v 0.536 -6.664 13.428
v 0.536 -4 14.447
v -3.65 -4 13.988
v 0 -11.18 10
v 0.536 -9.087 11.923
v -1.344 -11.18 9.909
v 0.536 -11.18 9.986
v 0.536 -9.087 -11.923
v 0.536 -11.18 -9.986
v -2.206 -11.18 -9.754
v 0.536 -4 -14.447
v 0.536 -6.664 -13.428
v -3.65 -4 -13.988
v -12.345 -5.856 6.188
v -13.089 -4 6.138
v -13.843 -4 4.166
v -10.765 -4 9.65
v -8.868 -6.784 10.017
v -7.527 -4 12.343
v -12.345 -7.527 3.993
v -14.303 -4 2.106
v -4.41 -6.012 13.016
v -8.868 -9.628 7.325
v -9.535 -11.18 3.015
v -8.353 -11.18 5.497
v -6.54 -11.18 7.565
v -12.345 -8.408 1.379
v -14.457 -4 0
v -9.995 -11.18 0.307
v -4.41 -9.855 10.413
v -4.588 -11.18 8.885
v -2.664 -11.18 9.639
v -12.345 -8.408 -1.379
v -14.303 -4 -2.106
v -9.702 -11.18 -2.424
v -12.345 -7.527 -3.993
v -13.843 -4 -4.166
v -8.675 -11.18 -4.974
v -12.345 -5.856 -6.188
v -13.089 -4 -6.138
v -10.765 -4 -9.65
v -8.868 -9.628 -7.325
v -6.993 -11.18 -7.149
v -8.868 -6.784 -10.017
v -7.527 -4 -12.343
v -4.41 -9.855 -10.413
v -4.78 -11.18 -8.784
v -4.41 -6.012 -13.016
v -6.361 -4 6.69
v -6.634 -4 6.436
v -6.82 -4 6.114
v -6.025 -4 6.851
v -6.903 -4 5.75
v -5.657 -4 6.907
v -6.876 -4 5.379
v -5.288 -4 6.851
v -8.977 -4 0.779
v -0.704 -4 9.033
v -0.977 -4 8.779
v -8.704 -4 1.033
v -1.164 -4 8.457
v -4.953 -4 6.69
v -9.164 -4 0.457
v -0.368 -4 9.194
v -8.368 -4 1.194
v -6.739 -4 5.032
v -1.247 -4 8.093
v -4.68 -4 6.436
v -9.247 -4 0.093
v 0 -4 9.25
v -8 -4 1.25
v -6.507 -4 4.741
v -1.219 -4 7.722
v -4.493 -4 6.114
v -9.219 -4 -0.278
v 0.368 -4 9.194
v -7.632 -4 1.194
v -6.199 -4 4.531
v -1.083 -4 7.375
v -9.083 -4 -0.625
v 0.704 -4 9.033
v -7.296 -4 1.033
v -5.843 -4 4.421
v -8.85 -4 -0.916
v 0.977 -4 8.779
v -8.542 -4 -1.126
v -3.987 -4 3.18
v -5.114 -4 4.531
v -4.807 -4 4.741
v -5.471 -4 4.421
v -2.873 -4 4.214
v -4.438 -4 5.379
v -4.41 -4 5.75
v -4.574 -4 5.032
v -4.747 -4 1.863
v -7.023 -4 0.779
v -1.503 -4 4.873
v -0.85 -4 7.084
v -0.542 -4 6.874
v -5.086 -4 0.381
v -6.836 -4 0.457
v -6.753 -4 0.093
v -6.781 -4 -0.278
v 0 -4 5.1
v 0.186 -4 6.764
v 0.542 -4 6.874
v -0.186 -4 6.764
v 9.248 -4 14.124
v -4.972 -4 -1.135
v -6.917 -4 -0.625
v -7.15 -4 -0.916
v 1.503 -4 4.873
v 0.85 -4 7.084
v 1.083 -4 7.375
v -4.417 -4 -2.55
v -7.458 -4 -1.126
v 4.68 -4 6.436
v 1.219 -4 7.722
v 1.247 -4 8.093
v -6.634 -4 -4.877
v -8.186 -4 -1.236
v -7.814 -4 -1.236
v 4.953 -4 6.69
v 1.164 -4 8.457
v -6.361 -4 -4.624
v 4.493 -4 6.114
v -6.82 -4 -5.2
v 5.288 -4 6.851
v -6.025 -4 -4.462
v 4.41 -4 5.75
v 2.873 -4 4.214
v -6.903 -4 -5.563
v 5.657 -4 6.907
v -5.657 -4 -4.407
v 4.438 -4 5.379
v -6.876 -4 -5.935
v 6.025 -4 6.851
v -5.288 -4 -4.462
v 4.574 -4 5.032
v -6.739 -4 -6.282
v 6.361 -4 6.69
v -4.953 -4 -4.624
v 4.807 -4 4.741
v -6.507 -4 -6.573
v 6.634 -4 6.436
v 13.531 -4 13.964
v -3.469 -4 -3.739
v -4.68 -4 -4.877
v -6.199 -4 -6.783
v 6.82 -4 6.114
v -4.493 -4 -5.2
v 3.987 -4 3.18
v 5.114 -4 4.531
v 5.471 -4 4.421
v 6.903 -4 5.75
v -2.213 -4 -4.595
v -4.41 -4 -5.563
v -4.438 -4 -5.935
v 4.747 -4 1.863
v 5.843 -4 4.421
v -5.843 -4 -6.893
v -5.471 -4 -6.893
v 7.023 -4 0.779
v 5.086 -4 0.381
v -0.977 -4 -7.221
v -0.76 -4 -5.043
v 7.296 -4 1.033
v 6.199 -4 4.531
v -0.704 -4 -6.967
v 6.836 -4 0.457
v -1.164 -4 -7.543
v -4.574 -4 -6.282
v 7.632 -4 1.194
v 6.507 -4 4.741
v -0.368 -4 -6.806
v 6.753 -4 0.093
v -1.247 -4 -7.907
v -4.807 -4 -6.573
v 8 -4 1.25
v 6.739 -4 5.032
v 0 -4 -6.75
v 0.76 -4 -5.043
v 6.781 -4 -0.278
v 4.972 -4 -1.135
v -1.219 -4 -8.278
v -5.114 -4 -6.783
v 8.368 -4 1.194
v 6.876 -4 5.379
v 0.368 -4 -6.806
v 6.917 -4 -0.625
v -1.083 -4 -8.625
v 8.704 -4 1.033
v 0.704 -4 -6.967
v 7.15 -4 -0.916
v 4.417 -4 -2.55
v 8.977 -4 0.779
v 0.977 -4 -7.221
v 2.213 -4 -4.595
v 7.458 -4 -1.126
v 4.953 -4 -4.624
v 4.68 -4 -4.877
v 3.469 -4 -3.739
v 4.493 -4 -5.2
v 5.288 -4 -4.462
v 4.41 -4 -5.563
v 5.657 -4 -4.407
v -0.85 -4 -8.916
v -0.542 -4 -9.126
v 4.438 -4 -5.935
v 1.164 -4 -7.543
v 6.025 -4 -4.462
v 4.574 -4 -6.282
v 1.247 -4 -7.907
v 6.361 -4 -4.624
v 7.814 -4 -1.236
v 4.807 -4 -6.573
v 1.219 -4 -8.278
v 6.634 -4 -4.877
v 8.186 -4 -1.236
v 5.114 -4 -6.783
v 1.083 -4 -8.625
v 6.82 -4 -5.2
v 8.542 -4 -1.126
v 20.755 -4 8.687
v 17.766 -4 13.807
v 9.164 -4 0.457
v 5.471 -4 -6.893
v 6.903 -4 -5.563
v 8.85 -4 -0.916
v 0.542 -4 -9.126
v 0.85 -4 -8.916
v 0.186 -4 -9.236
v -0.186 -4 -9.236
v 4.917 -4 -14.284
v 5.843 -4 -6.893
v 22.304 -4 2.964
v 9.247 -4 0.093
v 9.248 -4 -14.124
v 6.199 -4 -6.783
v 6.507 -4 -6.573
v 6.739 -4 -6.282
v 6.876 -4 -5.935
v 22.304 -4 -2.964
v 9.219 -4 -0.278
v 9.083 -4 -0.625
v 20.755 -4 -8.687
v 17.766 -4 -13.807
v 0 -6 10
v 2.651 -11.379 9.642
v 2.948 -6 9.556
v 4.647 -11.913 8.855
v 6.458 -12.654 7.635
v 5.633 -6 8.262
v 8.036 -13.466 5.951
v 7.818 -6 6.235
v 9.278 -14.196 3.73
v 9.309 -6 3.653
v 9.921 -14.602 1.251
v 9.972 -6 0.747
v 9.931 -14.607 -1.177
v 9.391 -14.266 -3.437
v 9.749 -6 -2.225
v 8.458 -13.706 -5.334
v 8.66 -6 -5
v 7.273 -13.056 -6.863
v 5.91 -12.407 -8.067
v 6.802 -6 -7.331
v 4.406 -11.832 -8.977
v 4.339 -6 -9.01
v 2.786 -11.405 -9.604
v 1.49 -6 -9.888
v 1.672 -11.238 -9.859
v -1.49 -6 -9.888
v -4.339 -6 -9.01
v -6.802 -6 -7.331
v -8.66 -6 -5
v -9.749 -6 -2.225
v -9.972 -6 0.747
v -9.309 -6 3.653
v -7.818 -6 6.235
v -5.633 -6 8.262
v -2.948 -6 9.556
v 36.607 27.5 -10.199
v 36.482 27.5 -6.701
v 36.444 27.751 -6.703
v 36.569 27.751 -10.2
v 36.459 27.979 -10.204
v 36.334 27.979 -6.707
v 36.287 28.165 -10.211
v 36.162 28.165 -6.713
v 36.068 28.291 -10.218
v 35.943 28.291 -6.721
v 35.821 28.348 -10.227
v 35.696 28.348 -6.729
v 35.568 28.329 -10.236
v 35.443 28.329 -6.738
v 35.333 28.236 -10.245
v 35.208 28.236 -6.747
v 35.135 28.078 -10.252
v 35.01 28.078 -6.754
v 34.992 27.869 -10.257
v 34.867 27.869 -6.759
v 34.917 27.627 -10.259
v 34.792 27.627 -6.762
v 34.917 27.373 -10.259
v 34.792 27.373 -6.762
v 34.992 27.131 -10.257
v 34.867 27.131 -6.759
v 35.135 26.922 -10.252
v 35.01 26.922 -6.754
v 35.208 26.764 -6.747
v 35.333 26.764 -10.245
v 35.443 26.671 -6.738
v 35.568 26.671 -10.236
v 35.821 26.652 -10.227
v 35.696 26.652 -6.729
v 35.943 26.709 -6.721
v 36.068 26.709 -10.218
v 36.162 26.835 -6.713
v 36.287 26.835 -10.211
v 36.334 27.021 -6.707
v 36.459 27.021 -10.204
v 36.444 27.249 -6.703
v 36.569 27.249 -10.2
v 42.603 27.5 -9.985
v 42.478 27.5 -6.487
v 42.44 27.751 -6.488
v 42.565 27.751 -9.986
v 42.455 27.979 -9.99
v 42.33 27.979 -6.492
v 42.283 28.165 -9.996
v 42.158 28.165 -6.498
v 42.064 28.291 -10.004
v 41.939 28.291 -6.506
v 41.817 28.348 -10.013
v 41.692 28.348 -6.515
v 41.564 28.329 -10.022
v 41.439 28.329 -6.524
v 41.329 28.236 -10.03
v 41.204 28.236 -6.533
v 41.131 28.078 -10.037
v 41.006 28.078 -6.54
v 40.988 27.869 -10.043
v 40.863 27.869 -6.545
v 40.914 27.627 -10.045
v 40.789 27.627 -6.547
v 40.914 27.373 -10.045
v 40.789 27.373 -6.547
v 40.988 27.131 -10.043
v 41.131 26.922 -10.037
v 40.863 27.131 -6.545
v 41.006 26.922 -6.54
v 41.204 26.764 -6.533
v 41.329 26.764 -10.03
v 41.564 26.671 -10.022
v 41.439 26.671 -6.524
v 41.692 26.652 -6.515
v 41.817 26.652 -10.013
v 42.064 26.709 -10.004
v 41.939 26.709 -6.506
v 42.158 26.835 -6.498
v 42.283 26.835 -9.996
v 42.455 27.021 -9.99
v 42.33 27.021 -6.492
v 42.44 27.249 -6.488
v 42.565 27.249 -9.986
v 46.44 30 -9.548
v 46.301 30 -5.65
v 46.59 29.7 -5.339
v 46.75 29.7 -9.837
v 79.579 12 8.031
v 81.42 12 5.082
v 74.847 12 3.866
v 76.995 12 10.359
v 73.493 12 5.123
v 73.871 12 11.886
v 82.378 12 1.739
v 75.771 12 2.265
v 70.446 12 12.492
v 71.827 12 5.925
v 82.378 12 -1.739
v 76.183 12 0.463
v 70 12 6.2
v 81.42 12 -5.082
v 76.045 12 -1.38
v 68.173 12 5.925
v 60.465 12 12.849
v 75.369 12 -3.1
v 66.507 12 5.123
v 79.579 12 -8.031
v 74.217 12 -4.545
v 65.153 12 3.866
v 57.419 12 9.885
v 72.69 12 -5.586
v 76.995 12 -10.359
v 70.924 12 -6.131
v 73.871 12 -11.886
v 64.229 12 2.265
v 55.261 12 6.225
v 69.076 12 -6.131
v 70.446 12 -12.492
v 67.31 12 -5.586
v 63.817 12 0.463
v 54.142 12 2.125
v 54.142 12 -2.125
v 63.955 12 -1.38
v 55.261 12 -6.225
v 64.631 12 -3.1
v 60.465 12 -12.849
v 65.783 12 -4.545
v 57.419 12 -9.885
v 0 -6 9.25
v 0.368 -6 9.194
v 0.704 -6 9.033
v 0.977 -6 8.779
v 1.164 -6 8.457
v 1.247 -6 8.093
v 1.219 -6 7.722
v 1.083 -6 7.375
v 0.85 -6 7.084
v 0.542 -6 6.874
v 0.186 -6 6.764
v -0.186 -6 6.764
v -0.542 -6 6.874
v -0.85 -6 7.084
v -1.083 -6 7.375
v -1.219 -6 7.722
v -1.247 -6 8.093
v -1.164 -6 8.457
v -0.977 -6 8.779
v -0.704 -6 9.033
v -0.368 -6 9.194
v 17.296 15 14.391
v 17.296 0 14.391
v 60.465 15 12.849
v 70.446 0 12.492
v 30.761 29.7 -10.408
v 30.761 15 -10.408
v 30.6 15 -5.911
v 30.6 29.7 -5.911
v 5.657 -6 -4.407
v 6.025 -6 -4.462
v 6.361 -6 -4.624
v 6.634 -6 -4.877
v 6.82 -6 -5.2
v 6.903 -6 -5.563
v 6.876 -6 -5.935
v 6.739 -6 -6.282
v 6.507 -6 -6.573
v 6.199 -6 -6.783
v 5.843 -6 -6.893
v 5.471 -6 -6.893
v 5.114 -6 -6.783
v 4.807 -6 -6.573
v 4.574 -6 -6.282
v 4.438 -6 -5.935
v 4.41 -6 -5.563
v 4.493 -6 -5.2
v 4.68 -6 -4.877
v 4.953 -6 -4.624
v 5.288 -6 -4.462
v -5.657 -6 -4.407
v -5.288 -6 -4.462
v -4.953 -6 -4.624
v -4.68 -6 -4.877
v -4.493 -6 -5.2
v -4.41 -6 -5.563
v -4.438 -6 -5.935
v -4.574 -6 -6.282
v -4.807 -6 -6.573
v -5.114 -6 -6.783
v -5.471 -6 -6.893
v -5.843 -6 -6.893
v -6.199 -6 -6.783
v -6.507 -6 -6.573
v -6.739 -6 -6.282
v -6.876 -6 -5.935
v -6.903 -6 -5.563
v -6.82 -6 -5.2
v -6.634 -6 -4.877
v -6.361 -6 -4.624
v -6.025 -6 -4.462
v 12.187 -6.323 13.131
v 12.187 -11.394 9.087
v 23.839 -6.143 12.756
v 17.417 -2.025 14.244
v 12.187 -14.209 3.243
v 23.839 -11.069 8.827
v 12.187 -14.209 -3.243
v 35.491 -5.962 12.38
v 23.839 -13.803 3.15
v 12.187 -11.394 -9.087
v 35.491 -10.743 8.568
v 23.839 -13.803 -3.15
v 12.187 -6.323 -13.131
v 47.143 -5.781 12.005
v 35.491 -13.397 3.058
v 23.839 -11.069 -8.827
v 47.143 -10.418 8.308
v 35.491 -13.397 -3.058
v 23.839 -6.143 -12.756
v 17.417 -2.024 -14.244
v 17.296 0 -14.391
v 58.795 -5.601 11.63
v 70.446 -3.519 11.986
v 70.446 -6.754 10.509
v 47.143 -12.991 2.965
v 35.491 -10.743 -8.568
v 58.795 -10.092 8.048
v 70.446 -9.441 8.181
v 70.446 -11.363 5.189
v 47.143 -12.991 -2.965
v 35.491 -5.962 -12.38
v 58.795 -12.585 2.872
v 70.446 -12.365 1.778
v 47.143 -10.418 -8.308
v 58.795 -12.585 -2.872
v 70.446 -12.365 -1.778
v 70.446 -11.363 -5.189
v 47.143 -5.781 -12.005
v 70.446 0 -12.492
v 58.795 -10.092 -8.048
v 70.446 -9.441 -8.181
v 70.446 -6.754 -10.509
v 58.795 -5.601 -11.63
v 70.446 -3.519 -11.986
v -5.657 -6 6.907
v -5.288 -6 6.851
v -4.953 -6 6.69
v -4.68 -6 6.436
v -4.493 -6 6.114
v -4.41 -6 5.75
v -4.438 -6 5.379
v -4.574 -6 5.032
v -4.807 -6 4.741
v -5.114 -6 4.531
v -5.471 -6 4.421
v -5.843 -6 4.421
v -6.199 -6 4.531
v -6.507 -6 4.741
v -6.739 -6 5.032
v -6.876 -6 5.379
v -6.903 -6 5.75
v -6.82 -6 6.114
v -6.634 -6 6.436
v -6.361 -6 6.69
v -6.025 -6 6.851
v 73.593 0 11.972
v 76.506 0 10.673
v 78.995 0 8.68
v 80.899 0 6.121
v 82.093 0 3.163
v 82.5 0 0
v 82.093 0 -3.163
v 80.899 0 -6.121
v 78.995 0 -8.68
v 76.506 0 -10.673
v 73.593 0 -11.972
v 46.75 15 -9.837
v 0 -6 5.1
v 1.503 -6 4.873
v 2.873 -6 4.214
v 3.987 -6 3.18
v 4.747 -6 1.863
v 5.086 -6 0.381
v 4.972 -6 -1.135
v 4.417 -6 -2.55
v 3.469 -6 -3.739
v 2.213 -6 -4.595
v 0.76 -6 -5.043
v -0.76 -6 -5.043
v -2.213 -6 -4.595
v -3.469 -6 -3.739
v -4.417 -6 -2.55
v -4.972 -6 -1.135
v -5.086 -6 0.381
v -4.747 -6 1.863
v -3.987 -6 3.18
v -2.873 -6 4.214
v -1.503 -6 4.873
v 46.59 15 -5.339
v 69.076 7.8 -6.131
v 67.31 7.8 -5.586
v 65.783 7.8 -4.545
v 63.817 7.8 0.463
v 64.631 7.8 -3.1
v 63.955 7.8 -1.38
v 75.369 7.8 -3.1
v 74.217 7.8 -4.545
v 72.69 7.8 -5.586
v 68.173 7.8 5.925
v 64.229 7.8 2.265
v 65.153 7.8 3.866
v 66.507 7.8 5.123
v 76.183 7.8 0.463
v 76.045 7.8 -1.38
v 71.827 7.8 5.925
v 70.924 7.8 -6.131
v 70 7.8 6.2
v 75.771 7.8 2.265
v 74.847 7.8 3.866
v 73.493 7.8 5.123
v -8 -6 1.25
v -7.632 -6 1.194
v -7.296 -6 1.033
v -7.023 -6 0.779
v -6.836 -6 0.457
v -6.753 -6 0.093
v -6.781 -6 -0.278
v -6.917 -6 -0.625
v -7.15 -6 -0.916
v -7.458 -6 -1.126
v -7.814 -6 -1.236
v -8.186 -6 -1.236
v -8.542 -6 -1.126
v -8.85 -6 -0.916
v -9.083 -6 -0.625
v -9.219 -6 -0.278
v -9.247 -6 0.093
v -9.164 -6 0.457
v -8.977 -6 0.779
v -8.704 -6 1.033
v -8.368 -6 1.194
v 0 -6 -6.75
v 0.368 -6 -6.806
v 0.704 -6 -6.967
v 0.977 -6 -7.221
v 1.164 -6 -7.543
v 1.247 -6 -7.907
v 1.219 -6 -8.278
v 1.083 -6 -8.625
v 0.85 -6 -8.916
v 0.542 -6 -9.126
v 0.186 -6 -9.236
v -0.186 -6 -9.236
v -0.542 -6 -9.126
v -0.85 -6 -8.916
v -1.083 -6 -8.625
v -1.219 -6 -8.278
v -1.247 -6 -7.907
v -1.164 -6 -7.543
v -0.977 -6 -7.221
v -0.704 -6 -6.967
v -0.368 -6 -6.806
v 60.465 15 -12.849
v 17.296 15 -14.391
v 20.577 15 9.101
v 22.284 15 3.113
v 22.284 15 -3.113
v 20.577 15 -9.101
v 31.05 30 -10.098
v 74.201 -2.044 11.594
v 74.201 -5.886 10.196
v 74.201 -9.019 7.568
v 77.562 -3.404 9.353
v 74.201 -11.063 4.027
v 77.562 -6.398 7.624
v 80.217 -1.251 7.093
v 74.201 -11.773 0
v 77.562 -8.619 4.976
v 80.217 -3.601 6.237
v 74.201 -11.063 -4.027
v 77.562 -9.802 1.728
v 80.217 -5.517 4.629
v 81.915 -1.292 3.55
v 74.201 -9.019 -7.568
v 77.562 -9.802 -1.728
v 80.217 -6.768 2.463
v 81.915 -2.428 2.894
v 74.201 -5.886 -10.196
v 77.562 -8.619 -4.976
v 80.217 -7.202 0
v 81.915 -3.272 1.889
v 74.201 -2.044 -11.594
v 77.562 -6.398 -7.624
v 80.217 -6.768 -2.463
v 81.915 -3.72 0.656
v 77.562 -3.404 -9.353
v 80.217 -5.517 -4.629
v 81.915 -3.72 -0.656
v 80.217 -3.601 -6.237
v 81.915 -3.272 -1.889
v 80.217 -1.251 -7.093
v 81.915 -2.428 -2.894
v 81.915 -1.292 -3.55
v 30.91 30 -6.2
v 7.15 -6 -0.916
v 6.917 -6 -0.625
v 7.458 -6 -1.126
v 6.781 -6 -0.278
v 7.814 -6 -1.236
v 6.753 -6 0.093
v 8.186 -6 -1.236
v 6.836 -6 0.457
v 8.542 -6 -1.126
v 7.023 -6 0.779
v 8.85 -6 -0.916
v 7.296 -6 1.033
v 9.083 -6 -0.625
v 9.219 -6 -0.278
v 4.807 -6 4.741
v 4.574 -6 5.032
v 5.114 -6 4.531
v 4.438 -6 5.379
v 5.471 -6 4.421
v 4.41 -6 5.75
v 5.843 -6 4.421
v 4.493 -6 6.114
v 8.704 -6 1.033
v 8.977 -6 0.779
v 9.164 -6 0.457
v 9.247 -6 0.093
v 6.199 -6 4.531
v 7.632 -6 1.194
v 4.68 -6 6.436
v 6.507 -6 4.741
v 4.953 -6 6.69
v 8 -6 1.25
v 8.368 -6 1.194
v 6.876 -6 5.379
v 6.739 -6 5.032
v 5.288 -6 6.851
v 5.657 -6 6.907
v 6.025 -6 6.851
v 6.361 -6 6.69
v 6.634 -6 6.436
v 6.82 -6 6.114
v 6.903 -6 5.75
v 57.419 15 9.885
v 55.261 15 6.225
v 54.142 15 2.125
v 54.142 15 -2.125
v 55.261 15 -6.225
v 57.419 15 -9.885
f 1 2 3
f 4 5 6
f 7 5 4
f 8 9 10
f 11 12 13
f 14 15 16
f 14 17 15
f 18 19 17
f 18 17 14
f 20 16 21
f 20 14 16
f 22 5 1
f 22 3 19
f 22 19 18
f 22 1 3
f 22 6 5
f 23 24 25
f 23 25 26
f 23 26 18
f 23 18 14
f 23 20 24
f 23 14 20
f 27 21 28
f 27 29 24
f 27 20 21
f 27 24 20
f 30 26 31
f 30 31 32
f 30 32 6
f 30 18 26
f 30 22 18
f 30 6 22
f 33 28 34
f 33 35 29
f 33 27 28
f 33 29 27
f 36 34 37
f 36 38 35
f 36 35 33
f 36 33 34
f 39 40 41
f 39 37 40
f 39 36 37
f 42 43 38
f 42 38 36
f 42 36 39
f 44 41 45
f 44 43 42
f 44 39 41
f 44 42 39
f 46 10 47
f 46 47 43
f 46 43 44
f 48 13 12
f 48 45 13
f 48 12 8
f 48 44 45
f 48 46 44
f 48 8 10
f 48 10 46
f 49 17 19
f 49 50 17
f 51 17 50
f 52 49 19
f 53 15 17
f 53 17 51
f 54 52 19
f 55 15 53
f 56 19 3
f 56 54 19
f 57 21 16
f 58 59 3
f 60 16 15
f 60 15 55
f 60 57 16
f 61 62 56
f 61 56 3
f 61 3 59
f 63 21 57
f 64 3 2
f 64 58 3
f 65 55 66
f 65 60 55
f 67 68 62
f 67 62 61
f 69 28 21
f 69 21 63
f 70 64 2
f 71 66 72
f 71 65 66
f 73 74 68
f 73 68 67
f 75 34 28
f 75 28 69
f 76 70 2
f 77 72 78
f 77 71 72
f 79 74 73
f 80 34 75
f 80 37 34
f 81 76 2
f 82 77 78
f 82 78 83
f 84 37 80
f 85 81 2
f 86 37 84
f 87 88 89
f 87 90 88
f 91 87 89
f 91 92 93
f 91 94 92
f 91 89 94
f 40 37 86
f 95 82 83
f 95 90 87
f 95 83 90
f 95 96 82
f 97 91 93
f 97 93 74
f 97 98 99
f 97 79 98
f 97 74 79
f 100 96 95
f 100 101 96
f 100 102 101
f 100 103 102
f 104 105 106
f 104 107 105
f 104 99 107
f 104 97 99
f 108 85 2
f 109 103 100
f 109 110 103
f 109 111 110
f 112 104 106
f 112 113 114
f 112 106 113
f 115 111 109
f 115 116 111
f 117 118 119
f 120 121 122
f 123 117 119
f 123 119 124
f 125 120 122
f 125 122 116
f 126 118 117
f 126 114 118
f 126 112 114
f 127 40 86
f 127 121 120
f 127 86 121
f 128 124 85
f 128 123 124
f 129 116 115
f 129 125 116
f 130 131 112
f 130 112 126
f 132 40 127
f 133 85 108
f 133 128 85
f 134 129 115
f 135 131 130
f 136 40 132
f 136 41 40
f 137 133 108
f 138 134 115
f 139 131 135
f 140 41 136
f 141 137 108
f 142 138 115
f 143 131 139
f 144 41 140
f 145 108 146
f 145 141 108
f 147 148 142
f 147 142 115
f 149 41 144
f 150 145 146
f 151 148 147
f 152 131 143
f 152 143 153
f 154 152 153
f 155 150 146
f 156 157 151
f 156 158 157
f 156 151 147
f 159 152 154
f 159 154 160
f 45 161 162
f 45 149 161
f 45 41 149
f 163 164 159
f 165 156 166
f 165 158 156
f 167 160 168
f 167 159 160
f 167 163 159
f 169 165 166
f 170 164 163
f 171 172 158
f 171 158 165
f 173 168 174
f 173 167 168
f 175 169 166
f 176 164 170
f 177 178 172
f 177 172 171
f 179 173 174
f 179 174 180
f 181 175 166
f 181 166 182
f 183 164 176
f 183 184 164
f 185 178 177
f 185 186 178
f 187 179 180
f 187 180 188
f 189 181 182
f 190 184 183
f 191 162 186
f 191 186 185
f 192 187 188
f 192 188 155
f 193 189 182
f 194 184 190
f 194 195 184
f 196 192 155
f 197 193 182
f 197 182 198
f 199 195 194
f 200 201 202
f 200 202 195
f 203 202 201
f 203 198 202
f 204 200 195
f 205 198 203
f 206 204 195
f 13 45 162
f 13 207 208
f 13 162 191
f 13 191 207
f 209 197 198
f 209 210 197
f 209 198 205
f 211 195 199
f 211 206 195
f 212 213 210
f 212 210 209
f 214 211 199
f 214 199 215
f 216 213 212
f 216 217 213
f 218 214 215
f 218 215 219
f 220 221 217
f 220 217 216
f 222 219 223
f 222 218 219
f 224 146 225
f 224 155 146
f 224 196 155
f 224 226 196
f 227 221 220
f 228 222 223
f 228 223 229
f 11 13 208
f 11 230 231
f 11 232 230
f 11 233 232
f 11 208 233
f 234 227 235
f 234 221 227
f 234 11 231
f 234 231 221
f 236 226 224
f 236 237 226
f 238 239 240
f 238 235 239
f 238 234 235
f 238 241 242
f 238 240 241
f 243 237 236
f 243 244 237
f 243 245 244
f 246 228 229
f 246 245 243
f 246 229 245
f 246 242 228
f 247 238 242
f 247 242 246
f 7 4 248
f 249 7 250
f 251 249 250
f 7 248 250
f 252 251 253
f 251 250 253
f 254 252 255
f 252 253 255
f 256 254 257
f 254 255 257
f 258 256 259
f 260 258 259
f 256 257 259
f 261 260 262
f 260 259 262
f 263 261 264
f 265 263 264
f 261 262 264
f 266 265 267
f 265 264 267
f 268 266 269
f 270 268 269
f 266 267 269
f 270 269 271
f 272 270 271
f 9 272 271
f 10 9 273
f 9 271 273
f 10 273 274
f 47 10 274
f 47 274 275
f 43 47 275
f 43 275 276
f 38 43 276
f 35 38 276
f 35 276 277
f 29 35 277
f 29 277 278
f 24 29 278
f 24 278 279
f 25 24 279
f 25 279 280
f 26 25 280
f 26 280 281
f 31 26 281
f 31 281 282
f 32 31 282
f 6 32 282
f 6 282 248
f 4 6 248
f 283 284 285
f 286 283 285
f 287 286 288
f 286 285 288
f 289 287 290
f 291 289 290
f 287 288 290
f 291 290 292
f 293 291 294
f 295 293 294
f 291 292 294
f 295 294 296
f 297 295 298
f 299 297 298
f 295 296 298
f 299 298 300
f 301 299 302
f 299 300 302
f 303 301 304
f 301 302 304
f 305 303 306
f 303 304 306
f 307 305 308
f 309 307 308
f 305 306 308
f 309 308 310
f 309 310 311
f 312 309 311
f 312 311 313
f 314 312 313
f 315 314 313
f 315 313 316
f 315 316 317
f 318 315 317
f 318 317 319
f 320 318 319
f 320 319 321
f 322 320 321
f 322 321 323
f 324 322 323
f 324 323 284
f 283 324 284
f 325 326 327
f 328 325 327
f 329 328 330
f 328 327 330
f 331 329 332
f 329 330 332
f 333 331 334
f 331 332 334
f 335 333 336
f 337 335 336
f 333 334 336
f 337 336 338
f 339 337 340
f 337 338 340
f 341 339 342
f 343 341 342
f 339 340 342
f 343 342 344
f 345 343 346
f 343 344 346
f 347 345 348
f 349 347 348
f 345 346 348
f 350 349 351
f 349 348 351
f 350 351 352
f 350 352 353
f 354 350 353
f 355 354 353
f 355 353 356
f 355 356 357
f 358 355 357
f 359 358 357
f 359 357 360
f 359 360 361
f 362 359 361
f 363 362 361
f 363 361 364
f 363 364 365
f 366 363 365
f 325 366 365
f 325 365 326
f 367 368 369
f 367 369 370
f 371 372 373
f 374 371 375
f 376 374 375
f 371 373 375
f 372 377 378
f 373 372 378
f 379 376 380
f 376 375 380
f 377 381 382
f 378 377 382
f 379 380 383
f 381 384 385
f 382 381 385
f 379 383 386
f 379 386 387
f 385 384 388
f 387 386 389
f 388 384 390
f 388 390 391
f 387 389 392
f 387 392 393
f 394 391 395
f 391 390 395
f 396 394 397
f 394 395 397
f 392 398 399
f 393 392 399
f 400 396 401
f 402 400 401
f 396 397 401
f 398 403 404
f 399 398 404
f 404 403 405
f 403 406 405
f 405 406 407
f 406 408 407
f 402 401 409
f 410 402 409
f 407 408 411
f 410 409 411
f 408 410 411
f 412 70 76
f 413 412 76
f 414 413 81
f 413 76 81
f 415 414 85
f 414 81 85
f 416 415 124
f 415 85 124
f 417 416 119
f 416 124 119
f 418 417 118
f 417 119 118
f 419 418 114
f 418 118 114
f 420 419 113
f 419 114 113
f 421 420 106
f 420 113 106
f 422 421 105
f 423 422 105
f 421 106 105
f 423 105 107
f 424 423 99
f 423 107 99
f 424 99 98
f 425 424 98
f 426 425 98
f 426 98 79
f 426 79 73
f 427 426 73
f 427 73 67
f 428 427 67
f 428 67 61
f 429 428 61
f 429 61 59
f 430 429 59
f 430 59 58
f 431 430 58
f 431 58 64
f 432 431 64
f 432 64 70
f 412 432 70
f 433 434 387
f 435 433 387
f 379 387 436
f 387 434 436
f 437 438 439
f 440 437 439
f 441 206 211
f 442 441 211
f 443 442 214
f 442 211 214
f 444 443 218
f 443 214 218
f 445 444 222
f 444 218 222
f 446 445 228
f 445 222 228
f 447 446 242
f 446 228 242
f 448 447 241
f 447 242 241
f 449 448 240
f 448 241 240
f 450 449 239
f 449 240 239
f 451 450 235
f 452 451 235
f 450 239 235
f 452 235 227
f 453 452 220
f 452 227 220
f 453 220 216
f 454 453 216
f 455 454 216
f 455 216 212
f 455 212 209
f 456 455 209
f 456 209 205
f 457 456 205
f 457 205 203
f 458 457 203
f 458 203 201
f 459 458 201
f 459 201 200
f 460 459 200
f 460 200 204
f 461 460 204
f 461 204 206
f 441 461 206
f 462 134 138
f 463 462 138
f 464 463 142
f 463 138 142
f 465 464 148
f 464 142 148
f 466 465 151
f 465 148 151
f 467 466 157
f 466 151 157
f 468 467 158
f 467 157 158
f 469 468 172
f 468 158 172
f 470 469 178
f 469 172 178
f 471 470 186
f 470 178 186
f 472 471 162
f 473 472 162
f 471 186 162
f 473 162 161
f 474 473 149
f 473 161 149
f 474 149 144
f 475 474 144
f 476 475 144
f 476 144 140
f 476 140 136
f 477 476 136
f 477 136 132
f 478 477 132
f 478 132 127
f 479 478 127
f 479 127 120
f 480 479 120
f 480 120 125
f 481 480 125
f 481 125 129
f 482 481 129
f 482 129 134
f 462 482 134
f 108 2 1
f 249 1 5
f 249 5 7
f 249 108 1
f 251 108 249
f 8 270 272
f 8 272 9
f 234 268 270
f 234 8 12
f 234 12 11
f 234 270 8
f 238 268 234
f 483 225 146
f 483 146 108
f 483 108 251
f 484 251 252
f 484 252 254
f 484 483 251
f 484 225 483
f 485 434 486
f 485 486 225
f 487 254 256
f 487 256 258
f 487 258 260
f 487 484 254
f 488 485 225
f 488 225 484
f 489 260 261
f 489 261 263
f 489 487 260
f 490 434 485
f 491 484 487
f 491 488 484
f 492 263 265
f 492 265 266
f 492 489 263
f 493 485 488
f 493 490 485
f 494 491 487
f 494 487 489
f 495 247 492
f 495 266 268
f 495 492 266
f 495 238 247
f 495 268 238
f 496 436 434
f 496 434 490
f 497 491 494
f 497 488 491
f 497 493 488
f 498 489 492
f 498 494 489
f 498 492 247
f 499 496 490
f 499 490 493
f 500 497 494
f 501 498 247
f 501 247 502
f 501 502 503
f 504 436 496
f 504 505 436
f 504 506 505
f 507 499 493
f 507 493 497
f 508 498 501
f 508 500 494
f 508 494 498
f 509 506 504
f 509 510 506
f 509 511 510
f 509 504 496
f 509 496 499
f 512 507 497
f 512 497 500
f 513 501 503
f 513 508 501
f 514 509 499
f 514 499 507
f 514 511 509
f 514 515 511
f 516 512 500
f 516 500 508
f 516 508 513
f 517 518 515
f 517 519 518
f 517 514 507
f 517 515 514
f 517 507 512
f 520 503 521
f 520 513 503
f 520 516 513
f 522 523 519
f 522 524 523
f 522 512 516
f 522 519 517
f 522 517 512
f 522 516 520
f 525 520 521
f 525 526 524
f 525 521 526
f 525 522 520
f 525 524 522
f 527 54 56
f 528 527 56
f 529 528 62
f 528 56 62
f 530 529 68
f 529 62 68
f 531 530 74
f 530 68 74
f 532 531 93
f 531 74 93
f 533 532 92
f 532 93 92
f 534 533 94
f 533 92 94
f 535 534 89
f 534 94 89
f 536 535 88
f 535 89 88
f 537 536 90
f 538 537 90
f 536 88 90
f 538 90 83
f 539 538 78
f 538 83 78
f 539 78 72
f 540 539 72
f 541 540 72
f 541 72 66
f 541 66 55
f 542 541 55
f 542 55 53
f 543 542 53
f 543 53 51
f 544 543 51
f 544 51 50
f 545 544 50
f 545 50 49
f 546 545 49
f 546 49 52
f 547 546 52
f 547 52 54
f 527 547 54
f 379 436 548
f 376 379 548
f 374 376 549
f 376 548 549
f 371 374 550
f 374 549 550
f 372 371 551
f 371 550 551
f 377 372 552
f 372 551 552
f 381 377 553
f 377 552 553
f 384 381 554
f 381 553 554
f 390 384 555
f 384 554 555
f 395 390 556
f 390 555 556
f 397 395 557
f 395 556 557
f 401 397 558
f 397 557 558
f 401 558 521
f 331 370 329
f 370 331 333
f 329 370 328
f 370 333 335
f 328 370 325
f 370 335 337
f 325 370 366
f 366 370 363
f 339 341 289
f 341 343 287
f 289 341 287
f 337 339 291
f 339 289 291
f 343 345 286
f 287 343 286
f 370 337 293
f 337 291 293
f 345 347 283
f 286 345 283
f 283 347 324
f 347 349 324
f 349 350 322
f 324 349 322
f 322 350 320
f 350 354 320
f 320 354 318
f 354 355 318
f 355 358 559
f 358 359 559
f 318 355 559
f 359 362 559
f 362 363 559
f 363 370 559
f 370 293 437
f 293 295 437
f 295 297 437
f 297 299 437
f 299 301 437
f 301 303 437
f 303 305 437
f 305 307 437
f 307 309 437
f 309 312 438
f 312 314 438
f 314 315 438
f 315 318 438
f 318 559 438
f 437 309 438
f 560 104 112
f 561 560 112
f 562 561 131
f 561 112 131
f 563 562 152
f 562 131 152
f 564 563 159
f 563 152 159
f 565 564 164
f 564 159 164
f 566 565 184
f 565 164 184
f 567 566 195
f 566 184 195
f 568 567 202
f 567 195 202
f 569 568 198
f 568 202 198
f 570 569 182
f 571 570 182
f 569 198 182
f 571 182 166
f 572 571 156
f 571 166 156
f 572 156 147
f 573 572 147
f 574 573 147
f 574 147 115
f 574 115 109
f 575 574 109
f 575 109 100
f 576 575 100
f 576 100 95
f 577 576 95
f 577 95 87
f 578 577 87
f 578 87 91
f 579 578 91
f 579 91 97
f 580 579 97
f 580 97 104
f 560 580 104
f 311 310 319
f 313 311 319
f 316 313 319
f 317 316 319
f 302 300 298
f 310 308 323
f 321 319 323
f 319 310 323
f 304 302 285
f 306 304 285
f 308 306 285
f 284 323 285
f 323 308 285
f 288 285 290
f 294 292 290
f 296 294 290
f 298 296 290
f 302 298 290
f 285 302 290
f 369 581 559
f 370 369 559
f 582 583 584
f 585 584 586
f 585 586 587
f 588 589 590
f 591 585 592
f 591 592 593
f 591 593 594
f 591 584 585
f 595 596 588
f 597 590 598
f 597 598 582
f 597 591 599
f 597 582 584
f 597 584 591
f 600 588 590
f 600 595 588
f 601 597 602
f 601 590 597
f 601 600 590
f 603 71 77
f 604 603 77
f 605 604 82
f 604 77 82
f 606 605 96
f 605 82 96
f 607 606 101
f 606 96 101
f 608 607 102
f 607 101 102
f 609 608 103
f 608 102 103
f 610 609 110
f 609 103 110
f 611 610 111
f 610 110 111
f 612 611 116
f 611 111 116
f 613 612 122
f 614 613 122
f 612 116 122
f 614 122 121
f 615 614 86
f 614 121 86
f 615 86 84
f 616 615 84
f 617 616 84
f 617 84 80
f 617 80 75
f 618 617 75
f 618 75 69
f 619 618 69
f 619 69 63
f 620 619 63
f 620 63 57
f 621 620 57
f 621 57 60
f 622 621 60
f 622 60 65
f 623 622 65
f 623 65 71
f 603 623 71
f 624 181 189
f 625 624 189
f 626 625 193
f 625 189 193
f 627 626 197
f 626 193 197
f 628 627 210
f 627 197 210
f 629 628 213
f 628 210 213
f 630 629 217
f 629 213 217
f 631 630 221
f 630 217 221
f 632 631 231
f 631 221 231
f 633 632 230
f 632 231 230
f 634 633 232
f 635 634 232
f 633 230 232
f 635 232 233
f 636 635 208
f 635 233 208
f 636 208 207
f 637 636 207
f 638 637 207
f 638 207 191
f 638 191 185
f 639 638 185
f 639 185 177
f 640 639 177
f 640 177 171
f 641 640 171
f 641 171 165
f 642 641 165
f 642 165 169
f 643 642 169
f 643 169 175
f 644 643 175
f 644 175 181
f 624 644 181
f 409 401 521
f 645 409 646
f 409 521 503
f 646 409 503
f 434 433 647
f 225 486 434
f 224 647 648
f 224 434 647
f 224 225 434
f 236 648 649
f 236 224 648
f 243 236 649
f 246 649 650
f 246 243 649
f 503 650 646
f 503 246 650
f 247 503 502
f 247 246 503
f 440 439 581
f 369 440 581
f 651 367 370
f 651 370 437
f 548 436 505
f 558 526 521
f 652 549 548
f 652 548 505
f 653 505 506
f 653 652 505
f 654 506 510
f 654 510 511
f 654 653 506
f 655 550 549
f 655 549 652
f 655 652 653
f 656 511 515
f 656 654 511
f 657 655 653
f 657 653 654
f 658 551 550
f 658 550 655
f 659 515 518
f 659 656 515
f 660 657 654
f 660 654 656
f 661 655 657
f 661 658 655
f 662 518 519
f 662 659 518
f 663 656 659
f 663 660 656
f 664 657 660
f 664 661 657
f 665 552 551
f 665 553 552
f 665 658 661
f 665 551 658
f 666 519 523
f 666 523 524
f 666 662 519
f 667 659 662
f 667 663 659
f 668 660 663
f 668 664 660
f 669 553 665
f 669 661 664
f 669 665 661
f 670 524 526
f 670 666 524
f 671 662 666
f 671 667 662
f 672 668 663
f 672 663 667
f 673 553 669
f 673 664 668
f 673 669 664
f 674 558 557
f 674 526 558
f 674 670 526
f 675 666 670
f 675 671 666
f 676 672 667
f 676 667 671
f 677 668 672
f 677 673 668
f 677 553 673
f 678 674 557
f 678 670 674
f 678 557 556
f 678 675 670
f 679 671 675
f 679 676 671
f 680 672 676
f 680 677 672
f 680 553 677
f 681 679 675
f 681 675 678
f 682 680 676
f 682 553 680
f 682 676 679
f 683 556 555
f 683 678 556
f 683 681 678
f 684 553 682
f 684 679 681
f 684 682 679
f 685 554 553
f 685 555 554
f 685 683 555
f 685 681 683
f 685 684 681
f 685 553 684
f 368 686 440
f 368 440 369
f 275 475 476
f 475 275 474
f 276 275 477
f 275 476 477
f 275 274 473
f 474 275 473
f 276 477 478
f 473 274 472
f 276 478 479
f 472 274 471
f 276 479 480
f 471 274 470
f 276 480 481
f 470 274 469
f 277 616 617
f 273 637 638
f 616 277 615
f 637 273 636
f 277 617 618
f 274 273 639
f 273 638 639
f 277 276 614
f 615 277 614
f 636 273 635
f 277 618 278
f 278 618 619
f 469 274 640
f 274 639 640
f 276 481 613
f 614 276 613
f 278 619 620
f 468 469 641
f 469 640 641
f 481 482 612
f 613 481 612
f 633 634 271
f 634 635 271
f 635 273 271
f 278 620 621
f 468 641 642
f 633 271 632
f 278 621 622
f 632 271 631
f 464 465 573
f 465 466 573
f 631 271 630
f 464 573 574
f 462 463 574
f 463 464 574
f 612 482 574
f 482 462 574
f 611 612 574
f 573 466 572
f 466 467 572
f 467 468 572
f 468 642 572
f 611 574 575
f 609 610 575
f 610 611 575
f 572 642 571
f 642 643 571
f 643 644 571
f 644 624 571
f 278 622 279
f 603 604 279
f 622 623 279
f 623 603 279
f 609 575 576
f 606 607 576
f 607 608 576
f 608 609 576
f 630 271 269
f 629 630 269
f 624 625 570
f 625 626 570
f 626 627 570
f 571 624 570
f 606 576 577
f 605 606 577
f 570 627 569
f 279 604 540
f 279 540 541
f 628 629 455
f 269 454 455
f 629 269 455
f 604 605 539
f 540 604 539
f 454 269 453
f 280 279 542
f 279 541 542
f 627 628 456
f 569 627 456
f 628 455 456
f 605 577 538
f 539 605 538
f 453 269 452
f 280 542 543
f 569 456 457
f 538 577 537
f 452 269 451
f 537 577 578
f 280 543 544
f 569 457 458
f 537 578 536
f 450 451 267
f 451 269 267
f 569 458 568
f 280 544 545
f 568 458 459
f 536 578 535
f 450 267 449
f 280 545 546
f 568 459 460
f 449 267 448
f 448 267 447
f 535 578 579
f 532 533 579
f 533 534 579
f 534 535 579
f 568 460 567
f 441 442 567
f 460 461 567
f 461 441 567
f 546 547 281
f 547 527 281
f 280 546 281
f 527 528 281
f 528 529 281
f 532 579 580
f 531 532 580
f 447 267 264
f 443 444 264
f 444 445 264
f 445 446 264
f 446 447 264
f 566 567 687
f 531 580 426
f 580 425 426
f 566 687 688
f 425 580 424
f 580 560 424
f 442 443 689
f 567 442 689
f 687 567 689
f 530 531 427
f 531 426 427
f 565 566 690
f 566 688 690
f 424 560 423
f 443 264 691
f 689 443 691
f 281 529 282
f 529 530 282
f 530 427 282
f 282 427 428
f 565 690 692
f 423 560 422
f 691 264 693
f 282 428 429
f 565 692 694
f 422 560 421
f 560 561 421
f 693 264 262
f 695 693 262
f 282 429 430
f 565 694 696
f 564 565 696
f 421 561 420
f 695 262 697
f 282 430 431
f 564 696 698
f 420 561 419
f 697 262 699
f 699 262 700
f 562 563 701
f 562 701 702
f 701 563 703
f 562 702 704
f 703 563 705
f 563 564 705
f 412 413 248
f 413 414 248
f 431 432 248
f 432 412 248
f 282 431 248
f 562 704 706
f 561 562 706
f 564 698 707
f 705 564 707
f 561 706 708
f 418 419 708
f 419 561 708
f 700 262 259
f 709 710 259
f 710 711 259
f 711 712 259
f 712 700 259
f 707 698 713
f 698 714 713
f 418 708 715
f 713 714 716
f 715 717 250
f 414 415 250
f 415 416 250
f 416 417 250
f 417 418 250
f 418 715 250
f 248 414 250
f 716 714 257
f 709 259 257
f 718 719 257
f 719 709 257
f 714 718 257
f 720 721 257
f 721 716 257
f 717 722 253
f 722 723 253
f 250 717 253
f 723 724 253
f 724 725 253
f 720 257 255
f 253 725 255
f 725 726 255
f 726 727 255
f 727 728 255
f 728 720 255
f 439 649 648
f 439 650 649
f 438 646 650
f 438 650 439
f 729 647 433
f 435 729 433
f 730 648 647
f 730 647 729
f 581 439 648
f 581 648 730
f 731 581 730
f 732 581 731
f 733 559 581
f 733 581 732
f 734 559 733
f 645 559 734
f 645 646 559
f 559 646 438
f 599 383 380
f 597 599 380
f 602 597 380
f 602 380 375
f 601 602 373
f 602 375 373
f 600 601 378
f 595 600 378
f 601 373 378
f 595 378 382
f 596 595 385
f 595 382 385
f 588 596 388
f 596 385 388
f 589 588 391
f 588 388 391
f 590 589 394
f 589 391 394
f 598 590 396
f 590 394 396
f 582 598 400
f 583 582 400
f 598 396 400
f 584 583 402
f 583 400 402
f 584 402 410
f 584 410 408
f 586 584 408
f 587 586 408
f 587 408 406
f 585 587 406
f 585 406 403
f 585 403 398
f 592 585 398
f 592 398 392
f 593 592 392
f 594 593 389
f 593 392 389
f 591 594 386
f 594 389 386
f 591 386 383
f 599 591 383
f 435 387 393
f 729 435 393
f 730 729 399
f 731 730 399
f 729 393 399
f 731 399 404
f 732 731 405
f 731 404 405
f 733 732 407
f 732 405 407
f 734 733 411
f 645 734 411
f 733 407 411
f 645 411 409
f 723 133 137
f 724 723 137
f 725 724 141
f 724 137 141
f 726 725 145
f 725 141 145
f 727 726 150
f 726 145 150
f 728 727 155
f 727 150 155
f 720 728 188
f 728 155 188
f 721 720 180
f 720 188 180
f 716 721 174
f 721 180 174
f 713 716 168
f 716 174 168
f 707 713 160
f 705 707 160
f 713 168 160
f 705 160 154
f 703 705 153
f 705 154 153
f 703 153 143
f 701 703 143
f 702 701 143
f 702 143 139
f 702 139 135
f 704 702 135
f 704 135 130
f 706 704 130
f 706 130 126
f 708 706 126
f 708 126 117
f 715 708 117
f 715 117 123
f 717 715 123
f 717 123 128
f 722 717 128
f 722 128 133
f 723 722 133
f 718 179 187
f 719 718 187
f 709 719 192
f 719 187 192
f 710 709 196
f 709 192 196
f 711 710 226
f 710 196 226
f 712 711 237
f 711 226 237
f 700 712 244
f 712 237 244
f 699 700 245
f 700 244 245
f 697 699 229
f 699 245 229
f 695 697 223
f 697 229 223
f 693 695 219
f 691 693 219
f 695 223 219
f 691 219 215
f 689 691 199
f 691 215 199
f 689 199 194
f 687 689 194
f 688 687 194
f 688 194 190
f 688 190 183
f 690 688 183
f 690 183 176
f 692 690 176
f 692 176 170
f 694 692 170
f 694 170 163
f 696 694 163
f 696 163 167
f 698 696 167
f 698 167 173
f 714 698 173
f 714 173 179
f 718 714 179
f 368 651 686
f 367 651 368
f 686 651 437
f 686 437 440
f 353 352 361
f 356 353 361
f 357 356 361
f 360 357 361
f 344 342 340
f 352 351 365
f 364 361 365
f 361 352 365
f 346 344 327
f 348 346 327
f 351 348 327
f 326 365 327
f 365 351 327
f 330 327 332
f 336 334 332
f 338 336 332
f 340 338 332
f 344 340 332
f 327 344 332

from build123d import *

# Parameters (mm, degrees)
EXTRUDE_1_DEPTH     = 15
REVOLVE_1_ANGLE     = 180.0000000000004
CUT_EXTRUDE_START   = -19
CUT_EXTRUDE_1_DEPTH = 19
SKETCH_5_R          = 10
CUT_EXTRUDE_2_DEPTH = 87.34958022017247
SKETCH_4_R          = 1.2499999999999991
SKETCH_4_R_2        = 1.2500000000000002
SKETCH_4_R_3        = 1.2499999999999996
SKETCH_4_R_4        = 1.2499999999999987
SKETCH_4_R_5        = 1.2499999999999984
SKETCH_4_R_6        = 1.249999999999999
SKETCH_4_R_7        = 5.1000000000000005
CUT_EXTRUDE_3_DEPTH = 86.88509768172823
CUT_EXTRUDE_START_2 = -3
CUT_EXTRUDE_5_DEPTH = 3
SKETCH_6_R          = 6.200000000000004
CUT_EXTRUDE_4_DEPTH = 4.2
EXTRUDE_2_DEPTH     = 15
CHAMFER_1_SIZE      = 0.3
HOLE_WIZARD_1_D     = 1.7
HOLE_WIZARD_1_DEPTH = 3.5


with BuildPart() as part:
    # 草图2 → 凸台-拉伸1 (new body)
    with BuildSketch(Plane(origin=(0, 0, 0), x_dir=(1, 0, 0), z_dir=(0, 1, 0))):
        with BuildLine():
            Line((70.44642857142858, 12.492025517529665), (0.5357142857142793, 14.990430621035568))
            ThreePointArc((0.5357142857142791, 14.990430621035566), (-10.41547612244118, 10.79434375693384), (-14.99999999999997, 1.22e-15))
            Line((-15, 0), (82.5, -8.67e-15))
            ThreePointArc((82.5, -8.44e-15), (78.99528646411157, 8.679563435367664), (70.44642857142858, 12.492025517529667))
        make_face()
        with BuildLine():
            Line((82.5, -8.67e-15), (-15, 0))
            ThreePointArc((-14.999999999999998, 0), (-10.415476122441204, -10.794343756933866), (0.535714285714286, -14.990430621035598))
            Line((0.5357142857142848, -14.990430621035598), (70.44642857142858, -12.492025517529669))
            ThreePointArc((70.44642857142858, -12.492025517529669), (78.99528646411156, -8.679563435367672), (82.5, -8.72e-15))
        make_face()
    extrude(amount=EXTRUDE_1_DEPTH)

    # 草图1 → 旋转1 (revolve)
    with BuildSketch(Plane(origin=(0, 0, 0), x_dir=(1, 0, 0), z_dir=(0, 1, 0))):
        with BuildLine():
            Line((0.5357142857142848, -14.990430621035598), (70.44642857142858, -12.492025517529669))
            ThreePointArc((70.44642857142858, -12.492025517529669), (78.99528646411156, -8.67956343536767), (82.5, 0))
            Line((82.5, 0), (-15, 0))
            ThreePointArc((-15, 0), (-10.415476122441207, -10.794343756933864), (0.5357142857142848, -14.990430621035598))
        make_face()
    revolve(axis=Axis((70, 0, 8.67e-15), (1, 0, 1.2e-16)), revolution_arc=REVOLVE_1_ANGLE)

    # 草图3 → 切除-拉伸1 (cut)
    with BuildSketch(Plane(origin=(0, 15, 0), x_dir=(1, 0, 0), z_dir=(0, 1, 0)).offset(CUT_EXTRUDE_START)):
        with BuildLine():
            Line((17.295525226029294, 14.391483841348133), (0.5357142857142793, 14.990430621035568))
            ThreePointArc((0.5357142857142793, 14.990430621035568), (-14.999999999999972, 1.84e-15), (0.5357142857142814, -14.990430621035584))
            Line((0.5357142857142814, -14.990430621035584), (17.29552522602928, -14.391483841348148))
            ThreePointArc((17.29552522602928, -14.391483841348148), (22.5, -9.99e-15), (17.295525226029294, 14.391483841348133))
        make_face()
    extrude(amount=CUT_EXTRUDE_1_DEPTH, mode=Mode.SUBTRACT)

    # 草图5 → 切除-拉伸2 (cut, through all)
    with BuildSketch(Plane(origin=(0, -6, 0), x_dir=(1, 0, 0), z_dir=(0, 1, 0))):
        with Locations(Location((0, 0, 0), (0, 0, 270))):
            Circle(SKETCH_5_R)
    extrude(amount=-CUT_EXTRUDE_2_DEPTH, mode=Mode.SUBTRACT)

    # 草图4 → 切除-拉伸3 (cut, through all)
    with BuildSketch(Plane(origin=(0, -4, 0), x_dir=(1, 0, 0), z_dir=(0, 1, 0))):
        with Locations(Location((8, 0, 0), (0, 0, 270))):
            Circle(SKETCH_4_R)
        with Locations(Location((5.656854249492371, -5.656854249492391, 0), (0, 0, 270))):
            Circle(SKETCH_4_R_2)
        with Locations(Location((-2.793e-14, -8, 0), (0, 0, 270))):
            Circle(SKETCH_4_R_3)
        with Locations(Location((-5.656854249492411, -5.65685424949235, 0), (0, 0, 270))):
            Circle(SKETCH_4_R_4)
        with Locations(Location((-8, 5.586e-14, 0), (0, 0, 270))):
            Circle(SKETCH_4_R_5)
        with Locations(Location((-5.65685424949233, 5.656854249492429, 0), (0, 0, 270))):
            Circle(SKETCH_4_R_3)
        with Locations(Location((8.38e-14, 7.999999999999998, 0), (0, 0, 270))):
            Circle(SKETCH_4_R_6)
        with Locations(Location((5.656854249492451, 5.656854249492311, 0), (0, 0, 270))):
            Circle(SKETCH_4_R_6)
        with Locations(Location((0, 0, 0), (0, 0, 270))):
            Circle(SKETCH_4_R_7)
    extrude(amount=-CUT_EXTRUDE_3_DEPTH, mode=Mode.SUBTRACT)

    # 草图11 → 切除-拉伸5 (cut)
    with BuildSketch(Plane(origin=(0, 15, 0), x_dir=(1, 0, 0), z_dir=(0, 1, 0)).offset(CUT_EXTRUDE_START_2)):
        with BuildLine():
            Line((60.46530800021301, 12.848721666733917), (70.44642857142858, 12.492025517529665))
            ThreePointArc((70.44642857142858, 12.492025517529665), (82.5, -8.67e-15), (70.44642857142858, -12.492025517529669))
            Line((70.44642857142858, -12.492025517529669), (60.46530800021299, -12.848721666733926))
            ThreePointArc((60.46530800021299, -12.848721666733926), (54, 3.9e-16), (60.46530800021301, 12.848721666733917))
        make_face()
    extrude(amount=CUT_EXTRUDE_5_DEPTH, mode=Mode.SUBTRACT)

    # 草图6 → 切除-拉伸4 (cut)
    with BuildSketch(Plane(origin=(0, 12, 0), x_dir=(1, 0, 0), z_dir=(0, 1, 0))):
        with Locations(Location((70, -8.67e-15, 0), (0, 0, 270))):
            Circle(SKETCH_6_R)
    extrude(amount=-CUT_EXTRUDE_4_DEPTH, mode=Mode.SUBTRACT)

    # 草图12 → 凸台-拉伸2 (add)
    with BuildSketch(Plane(origin=(0, 15, 0), x_dir=(1, 0, 0), z_dir=(0, 1, 0))):
        Polygon((38.755416613121156, 10.122335609132724), (38.59470232740688, 5.625206422822045), (46.58959865862586, 5.339492137107765), (46.750312944340145, 9.836621323418441), align=None)
        Polygon((30.760520281902174, 10.408049894847004), (30.59980599618789, 5.910920708536326), (38.59470232740688, 5.625206422822045), (38.755416613121156, 10.122335609132724), align=None)
    extrude(amount=EXTRUDE_2_DEPTH)

    # 倒角1
    chamfer_1_edges = [part.edges().sort_by_distance(p)[0] for p in [
        (38.755416613121156, 30, -10.122335609132723),
        (30.680163139045032, 30, -8.159485301691664),
        (38.59470232740688, 30, -5.625206422822045),
        (46.669955801483, 30, -7.588056730263103),
    ]]
    chamfer(chamfer_1_edges, length=CHAMFER_1_SIZE)

    # 孔1
    with Locations(Plane(origin=(0.41071428571427876, 0, -11.492663476127266), x_dir=(-0.9993620414023731, 0, -0.03571428571428518), z_dir=(0.03571428571428518, 0, -0.9993620414023731))):
        with Locations((-41.369180272, 27.499999998), (-35.369180272, 27.499999998)):
            Hole(HOLE_WIZARD_1_D / 2, depth=HOLE_WIZARD_1_DEPTH)


solid = part.part
